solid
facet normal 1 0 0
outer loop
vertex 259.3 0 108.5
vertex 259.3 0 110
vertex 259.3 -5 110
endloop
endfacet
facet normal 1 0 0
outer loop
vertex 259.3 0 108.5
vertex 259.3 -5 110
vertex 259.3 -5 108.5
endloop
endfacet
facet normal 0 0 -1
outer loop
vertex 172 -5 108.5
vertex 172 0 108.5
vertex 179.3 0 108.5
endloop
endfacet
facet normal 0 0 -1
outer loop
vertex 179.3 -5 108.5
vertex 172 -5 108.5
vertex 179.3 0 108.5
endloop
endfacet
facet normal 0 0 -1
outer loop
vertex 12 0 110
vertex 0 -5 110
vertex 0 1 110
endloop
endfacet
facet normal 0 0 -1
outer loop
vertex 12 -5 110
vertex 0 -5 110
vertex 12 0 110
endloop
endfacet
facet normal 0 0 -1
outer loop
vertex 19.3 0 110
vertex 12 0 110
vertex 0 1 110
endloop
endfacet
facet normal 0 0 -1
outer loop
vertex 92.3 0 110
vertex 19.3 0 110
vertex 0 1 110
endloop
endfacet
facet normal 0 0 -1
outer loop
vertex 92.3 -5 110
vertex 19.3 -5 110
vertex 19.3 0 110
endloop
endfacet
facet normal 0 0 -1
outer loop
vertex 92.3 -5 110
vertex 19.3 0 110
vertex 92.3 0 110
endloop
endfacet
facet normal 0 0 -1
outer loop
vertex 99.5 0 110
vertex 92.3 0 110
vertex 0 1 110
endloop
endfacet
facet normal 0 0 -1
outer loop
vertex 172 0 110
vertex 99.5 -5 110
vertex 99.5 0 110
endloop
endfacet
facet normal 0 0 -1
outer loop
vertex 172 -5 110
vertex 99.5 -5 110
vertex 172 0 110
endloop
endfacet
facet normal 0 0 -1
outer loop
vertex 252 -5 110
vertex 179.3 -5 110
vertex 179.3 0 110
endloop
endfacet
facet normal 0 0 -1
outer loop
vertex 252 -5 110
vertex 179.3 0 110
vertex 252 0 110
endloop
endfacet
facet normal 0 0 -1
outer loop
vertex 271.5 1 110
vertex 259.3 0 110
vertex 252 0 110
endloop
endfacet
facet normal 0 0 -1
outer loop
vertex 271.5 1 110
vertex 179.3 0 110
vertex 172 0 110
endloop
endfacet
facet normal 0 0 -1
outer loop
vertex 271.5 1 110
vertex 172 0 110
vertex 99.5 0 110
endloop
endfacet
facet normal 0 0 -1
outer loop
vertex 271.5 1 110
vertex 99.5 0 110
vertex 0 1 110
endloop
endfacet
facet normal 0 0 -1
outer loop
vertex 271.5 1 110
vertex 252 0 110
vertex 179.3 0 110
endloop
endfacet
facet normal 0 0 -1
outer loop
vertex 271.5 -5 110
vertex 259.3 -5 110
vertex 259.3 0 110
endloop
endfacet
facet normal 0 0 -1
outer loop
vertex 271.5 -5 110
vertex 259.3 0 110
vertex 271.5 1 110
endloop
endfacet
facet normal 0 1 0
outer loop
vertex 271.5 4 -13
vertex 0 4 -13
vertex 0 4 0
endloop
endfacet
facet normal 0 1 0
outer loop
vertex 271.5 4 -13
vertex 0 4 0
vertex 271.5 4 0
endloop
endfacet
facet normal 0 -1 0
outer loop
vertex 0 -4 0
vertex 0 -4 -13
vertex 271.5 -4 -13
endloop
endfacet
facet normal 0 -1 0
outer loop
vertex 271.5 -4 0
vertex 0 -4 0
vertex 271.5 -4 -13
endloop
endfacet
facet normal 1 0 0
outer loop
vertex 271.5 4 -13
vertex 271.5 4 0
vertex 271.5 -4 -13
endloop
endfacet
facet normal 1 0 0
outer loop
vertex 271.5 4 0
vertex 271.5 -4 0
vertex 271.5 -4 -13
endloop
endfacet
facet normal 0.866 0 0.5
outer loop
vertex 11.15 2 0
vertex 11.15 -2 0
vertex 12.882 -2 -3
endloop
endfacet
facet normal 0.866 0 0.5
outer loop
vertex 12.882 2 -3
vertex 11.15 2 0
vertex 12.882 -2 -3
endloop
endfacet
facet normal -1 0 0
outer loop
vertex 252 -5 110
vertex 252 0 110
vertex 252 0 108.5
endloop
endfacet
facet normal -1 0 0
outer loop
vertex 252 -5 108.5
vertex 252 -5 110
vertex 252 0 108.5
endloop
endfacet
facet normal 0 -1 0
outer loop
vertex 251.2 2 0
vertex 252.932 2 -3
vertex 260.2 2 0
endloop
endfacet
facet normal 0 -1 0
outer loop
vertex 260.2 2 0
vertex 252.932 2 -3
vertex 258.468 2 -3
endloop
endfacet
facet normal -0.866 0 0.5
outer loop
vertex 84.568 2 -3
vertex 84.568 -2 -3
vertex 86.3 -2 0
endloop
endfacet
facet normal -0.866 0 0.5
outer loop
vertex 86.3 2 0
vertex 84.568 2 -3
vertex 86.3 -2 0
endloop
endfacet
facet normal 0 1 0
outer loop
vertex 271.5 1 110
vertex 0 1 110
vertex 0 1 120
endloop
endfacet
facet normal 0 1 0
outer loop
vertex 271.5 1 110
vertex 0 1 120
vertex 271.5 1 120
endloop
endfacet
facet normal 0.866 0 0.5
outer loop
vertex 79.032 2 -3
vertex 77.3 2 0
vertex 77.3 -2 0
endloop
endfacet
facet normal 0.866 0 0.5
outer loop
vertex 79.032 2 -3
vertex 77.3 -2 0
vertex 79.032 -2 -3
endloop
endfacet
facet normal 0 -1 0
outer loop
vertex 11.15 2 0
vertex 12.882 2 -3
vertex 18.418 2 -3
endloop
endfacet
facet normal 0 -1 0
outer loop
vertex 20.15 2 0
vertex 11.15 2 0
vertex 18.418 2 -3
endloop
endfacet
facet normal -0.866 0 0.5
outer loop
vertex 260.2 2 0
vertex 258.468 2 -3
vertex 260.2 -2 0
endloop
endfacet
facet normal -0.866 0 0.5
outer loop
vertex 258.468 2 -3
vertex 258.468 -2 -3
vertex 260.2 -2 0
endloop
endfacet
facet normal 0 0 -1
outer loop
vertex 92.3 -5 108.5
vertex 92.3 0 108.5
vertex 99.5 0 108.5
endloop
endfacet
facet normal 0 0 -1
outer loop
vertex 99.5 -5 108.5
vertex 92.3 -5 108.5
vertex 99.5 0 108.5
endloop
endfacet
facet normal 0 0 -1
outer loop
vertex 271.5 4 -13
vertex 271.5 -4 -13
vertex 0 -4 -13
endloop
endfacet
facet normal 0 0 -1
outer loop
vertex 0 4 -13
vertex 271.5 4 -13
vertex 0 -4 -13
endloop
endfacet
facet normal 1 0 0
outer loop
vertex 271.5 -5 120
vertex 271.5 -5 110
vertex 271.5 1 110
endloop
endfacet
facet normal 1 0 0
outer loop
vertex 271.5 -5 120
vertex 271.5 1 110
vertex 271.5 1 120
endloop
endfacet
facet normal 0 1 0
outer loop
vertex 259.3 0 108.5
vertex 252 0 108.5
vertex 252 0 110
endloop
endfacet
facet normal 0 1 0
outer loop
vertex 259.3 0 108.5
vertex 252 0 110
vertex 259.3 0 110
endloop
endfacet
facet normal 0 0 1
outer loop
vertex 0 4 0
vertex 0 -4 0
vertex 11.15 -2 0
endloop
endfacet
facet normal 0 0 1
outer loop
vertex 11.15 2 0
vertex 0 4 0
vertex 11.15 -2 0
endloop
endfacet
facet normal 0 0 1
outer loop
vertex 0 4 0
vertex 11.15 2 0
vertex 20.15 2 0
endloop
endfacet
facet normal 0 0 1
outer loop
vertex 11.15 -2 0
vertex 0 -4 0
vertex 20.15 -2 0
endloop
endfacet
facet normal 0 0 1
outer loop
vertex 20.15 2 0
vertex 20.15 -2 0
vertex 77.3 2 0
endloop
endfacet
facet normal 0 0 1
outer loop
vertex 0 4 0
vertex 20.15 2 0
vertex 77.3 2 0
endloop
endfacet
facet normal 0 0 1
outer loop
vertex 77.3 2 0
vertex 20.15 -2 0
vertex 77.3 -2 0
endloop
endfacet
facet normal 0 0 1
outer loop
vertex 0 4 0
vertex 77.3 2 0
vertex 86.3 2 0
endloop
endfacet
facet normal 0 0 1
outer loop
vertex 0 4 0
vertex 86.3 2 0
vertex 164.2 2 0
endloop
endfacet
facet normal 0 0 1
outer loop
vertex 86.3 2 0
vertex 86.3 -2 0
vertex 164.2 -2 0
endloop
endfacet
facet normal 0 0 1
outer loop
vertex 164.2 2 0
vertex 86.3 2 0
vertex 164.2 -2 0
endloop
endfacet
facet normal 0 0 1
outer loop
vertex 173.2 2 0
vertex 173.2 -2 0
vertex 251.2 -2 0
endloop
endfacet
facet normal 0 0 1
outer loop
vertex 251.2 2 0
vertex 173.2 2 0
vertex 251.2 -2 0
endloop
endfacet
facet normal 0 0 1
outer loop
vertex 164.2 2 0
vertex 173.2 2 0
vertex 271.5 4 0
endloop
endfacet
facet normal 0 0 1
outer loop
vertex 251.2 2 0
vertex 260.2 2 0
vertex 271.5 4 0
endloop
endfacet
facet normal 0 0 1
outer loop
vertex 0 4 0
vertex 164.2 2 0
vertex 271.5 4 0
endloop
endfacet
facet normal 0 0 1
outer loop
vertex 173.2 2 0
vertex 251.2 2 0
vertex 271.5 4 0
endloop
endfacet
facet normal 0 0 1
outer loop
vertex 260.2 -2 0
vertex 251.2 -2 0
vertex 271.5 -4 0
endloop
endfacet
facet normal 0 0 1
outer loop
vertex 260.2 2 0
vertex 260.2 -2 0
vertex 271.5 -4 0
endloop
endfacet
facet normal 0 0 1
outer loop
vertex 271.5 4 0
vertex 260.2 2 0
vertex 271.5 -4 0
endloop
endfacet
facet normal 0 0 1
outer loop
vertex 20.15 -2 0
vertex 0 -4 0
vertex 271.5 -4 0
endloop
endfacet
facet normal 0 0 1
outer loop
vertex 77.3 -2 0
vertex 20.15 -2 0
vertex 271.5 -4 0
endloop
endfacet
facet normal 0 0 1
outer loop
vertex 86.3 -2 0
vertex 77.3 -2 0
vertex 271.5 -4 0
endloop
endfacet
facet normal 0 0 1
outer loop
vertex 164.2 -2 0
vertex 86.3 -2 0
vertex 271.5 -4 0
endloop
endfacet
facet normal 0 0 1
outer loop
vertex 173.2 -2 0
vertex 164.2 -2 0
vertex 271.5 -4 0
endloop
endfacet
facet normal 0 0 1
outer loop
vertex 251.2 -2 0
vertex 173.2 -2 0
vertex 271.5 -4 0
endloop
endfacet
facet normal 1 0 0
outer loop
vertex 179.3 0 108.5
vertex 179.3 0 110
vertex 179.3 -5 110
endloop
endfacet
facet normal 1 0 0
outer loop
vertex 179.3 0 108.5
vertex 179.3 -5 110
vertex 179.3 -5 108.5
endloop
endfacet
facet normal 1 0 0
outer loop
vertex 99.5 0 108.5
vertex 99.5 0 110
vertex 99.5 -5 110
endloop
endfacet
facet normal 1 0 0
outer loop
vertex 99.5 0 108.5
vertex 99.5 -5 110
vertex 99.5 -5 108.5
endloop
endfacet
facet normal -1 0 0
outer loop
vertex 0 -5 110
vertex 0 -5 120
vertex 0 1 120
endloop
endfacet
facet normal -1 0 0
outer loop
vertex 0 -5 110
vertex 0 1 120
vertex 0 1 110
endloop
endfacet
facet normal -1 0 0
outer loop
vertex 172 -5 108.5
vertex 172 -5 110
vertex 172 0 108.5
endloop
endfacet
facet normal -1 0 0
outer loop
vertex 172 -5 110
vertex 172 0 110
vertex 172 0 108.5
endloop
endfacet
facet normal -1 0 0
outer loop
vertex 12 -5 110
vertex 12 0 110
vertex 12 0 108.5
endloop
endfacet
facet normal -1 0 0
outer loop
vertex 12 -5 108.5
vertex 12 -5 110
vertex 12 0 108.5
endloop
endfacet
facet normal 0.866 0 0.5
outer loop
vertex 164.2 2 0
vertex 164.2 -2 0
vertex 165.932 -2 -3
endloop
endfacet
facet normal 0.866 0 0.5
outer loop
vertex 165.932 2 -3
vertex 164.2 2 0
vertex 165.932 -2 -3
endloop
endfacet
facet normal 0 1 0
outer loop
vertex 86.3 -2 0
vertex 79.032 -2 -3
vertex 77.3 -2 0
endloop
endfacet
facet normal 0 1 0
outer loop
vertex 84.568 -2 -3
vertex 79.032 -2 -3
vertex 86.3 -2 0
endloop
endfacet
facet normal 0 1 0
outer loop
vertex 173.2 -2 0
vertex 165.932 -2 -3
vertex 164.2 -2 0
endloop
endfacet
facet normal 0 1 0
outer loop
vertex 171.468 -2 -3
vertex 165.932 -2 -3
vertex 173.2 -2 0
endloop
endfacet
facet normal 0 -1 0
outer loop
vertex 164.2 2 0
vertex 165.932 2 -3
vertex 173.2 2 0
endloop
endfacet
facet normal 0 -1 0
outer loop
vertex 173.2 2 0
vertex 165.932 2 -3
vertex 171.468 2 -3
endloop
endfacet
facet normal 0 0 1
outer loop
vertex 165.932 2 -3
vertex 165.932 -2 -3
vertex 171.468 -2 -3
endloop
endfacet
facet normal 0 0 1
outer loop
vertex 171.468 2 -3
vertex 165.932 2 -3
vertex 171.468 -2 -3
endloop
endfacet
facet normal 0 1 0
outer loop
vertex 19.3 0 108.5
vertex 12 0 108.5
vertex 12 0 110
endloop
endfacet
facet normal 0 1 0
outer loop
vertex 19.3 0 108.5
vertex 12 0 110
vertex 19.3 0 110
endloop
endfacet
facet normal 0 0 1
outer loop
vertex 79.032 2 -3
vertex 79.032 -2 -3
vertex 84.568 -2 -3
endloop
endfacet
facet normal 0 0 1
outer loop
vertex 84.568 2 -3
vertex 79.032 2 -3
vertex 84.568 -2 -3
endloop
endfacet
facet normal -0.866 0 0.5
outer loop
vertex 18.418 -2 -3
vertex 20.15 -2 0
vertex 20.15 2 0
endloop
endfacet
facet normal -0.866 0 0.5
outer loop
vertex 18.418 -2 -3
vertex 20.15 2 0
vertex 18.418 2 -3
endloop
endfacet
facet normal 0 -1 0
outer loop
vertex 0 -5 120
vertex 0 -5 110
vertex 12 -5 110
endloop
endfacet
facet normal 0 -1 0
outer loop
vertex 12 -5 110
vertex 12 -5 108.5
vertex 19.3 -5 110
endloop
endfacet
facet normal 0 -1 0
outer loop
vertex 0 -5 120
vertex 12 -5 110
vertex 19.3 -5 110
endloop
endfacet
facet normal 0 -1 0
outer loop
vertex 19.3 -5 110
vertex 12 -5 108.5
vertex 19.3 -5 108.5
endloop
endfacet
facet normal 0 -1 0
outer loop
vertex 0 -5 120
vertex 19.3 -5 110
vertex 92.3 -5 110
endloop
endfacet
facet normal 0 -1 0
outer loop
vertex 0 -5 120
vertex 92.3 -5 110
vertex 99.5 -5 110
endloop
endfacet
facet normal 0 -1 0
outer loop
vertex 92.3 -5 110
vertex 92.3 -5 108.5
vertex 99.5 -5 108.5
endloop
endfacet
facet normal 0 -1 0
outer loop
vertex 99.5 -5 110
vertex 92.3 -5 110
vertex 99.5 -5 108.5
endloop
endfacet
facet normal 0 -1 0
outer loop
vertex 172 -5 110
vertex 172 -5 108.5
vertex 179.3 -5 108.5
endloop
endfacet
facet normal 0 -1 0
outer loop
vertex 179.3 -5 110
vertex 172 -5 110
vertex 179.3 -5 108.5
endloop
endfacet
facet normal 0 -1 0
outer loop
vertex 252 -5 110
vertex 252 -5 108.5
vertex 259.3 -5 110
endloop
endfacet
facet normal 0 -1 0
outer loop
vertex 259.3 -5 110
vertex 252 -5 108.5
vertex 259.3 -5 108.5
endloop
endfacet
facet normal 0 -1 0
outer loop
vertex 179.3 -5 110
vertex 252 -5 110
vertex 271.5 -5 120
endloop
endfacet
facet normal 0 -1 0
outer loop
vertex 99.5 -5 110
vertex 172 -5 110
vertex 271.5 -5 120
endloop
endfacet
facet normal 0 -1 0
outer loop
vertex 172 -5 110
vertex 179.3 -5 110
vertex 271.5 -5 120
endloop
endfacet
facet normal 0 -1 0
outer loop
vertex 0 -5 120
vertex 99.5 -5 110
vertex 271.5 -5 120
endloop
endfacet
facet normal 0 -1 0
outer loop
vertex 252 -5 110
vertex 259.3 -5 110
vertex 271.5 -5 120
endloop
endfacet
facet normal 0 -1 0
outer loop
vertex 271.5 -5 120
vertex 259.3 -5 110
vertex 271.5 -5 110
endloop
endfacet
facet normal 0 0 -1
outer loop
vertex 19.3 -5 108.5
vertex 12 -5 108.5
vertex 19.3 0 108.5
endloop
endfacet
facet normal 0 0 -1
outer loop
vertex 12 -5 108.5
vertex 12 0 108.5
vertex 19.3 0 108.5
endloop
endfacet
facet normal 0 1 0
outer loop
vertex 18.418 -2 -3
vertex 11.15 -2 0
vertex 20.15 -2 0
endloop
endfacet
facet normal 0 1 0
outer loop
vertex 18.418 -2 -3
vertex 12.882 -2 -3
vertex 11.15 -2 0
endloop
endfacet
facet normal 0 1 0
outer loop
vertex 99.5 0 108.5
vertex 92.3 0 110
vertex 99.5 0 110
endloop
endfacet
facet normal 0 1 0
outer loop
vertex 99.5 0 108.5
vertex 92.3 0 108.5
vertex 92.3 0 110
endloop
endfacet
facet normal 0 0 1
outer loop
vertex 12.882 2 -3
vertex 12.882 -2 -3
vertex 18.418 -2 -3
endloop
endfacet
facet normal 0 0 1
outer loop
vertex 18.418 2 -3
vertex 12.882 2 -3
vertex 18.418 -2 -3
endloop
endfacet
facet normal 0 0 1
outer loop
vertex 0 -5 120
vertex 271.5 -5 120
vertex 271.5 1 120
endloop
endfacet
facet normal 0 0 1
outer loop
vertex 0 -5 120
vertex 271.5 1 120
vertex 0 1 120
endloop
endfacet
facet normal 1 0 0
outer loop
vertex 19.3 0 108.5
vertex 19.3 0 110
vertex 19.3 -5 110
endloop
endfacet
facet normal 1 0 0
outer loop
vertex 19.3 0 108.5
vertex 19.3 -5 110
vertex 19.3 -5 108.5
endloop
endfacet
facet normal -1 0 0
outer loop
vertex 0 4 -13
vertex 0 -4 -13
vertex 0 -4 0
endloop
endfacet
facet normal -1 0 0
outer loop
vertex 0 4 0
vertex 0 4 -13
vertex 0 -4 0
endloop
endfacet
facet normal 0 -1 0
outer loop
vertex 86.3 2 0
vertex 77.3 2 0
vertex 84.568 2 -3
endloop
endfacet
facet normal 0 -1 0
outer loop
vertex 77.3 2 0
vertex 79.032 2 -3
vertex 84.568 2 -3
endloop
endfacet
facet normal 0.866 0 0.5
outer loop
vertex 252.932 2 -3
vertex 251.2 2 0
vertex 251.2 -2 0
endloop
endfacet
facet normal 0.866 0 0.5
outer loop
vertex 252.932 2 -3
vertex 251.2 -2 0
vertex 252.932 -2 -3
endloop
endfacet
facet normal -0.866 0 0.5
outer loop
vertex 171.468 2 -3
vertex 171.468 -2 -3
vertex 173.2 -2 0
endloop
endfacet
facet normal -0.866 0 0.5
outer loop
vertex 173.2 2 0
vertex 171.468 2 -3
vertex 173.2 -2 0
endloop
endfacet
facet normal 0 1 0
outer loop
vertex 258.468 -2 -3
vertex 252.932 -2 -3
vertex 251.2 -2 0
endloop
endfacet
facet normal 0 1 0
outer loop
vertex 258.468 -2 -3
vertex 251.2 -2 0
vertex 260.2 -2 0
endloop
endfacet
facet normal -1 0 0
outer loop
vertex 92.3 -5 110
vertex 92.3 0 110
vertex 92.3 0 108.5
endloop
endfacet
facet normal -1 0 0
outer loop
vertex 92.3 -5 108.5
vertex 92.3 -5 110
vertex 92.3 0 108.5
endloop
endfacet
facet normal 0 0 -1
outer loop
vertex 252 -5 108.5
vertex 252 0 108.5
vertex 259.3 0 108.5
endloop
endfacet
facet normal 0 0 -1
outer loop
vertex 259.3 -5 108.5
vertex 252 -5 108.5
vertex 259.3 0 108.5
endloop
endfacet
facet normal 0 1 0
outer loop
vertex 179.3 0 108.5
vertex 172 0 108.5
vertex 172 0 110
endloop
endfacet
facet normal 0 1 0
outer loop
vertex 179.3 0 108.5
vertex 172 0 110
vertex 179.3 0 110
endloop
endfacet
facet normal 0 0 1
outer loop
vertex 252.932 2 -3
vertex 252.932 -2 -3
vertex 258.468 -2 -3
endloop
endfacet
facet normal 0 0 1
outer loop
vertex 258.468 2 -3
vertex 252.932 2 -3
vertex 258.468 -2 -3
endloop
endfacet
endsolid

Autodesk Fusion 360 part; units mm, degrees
sketch "Sketch1" plane through (0, 0, 0) normal (0, 1, 0) x (1, 0, 0)
  line L0 (0, 0) -> (271.5, 0)
  line L1 (271.5, 0) -> (271.5, 3)
  line L2 (271.5, 3) -> (0, 3) construction
  line L3 (0, 3) -> (0, 0)
  line L4 (271.5, 3) -> (271.5, 13)
  line L5 (271.5, 13) -> (0, 13)
  line L6 (0, 13) -> (0, 3)
  line L7 (11.15, 0) -> (12.8821, 3)
  line L8 (77.3, 0) -> (79.0321, 3)
  line L9 (164.2, 0) -> (165.9321, 3)
  line L10 (251.2, 0) -> (252.9321, 3)
  line L11 (20.15, 0) -> (18.4179, 3)
  line L12 (84.5679, 3) -> (86.3, 0)
  line L13 (171.4679, 3) -> (173.2, 0)
  line L14 (258.4679, 3) -> (260.2, 0)
  line L15 (252.9321, 3) -> (258.4679, 3)
  line L16 (165.9321, 3) -> (171.4679, 3)
  line L17 (12.8821, 3) -> (18.4179, 3)
  line L18 (79.0321, 3) -> (84.5679, 3)
  line L19 (11.15, 0) -> (20.15, 0) construction
  line L20 (86.3, 0) -> (77.3, 0) construction
  line L21 (173.2, 0) -> (164.2, 0) construction
  line L22 (260.2, 0) -> (251.2, 0) construction
  line L23 (0, 0) -> (271.5, 0) construction
  line L24 (271.5, 0) -> (271.5, -110) construction
  line L25 (271.5, -110) -> (0, -110) construction
  line L26 (0, -110) -> (0, 0) construction
  line L27 (0, -108.5) -> (271.5, -108.5) construction
  line L28 (259.3, -110) -> (259.3, -108.5)
  line L29 (252, -110) -> (252, -108.5)
  line L30 (179.3, -110) -> (179.3, -108.5)
  line L31 (172, -110) -> (172, -108.5)
  line L32 (99.5, -110) -> (99.5, -108.5)
  line L33 (92.3, -110) -> (92.3, -108.5)
  line L34 (12, -110) -> (12, -108.5)
  line L35 (19.3, -110) -> (19.3, -108.5)
  line L36 (0, -110) -> (271.5, -110)
  line L37 (271.5, -110) -> (271.5, -120)
  line L38 (271.5, -120) -> (0, -120)
  line L39 (0, -120) -> (0, -110)
  line L40 (12, -108.5) -> (19.3, -108.5)
  line L41 (92.3, -108.5) -> (99.5, -108.5)
  line L42 (172, -108.5) -> (179.3, -108.5)
  line L43 (252, -108.5) -> (259.3, -108.5)
  point P0 (255.7, 0)
  point P1 (168.7, 0)
  point P2 (81.8, 0)
  point P3 (15.65, 0)
  dimension "d1" = 271.5
  dimension "d2" = 3
  dimension "d3" = 10
  dimension "d4" = 60
  dimension "d9" = 60
  dimension "d18" = 9
  dimension "d19" = 168.7
  dimension "d20" = 255.7
  dimension "d21" = 81.8
  dimension "d22" = 15.65
  dimension "d23" = 110
  dimension "d24" = 1.5
  dimension "d25" = 12.2
  dimension "d26" = 19.5
  dimension "d27" = 92.2
  dimension "d28" = 99.5
  dimension "d29" = 172
  dimension "d30" = 179.2
  dimension "d31" = 259.5
  dimension "d32" = 252.2
  dimension "d33" = 10
extrude "Extrude1" add sketch "Sketch1" along normal mid plane 8 contours L0 L1 L3 L4 L5 L6 L7 L8 L9 L10 L11 L12 L13 L14 L15 L16 L17 L18 | L0 L7 L11 L17 | L0 L8 L12 L18 | L0 L9 L13 L16 | L0 L10 L14 L15 makes body 1
extrude "Extrude2" cut sketch "Sketch1" along normal mid plane 4 contours L0 L7 L11 L17 | L0 L8 L12 L18 | L0 L9 L13 L16 | L0 L10 L14 L15 bodies 1
extrude "Extrude3" add sketch "Sketch1" against normal blind 5 separate body contours L28 L29 L36 L43 | L36 L37 L38 L39 | L30 L31 L36 L42 | L32 L33 L36 L41 | L34 L35 L36 L40 makes body 2
extrude "Extrude4" add sketch "Sketch1" along normal blind 1 contours L36 L37 L38 L39 bodies 2
